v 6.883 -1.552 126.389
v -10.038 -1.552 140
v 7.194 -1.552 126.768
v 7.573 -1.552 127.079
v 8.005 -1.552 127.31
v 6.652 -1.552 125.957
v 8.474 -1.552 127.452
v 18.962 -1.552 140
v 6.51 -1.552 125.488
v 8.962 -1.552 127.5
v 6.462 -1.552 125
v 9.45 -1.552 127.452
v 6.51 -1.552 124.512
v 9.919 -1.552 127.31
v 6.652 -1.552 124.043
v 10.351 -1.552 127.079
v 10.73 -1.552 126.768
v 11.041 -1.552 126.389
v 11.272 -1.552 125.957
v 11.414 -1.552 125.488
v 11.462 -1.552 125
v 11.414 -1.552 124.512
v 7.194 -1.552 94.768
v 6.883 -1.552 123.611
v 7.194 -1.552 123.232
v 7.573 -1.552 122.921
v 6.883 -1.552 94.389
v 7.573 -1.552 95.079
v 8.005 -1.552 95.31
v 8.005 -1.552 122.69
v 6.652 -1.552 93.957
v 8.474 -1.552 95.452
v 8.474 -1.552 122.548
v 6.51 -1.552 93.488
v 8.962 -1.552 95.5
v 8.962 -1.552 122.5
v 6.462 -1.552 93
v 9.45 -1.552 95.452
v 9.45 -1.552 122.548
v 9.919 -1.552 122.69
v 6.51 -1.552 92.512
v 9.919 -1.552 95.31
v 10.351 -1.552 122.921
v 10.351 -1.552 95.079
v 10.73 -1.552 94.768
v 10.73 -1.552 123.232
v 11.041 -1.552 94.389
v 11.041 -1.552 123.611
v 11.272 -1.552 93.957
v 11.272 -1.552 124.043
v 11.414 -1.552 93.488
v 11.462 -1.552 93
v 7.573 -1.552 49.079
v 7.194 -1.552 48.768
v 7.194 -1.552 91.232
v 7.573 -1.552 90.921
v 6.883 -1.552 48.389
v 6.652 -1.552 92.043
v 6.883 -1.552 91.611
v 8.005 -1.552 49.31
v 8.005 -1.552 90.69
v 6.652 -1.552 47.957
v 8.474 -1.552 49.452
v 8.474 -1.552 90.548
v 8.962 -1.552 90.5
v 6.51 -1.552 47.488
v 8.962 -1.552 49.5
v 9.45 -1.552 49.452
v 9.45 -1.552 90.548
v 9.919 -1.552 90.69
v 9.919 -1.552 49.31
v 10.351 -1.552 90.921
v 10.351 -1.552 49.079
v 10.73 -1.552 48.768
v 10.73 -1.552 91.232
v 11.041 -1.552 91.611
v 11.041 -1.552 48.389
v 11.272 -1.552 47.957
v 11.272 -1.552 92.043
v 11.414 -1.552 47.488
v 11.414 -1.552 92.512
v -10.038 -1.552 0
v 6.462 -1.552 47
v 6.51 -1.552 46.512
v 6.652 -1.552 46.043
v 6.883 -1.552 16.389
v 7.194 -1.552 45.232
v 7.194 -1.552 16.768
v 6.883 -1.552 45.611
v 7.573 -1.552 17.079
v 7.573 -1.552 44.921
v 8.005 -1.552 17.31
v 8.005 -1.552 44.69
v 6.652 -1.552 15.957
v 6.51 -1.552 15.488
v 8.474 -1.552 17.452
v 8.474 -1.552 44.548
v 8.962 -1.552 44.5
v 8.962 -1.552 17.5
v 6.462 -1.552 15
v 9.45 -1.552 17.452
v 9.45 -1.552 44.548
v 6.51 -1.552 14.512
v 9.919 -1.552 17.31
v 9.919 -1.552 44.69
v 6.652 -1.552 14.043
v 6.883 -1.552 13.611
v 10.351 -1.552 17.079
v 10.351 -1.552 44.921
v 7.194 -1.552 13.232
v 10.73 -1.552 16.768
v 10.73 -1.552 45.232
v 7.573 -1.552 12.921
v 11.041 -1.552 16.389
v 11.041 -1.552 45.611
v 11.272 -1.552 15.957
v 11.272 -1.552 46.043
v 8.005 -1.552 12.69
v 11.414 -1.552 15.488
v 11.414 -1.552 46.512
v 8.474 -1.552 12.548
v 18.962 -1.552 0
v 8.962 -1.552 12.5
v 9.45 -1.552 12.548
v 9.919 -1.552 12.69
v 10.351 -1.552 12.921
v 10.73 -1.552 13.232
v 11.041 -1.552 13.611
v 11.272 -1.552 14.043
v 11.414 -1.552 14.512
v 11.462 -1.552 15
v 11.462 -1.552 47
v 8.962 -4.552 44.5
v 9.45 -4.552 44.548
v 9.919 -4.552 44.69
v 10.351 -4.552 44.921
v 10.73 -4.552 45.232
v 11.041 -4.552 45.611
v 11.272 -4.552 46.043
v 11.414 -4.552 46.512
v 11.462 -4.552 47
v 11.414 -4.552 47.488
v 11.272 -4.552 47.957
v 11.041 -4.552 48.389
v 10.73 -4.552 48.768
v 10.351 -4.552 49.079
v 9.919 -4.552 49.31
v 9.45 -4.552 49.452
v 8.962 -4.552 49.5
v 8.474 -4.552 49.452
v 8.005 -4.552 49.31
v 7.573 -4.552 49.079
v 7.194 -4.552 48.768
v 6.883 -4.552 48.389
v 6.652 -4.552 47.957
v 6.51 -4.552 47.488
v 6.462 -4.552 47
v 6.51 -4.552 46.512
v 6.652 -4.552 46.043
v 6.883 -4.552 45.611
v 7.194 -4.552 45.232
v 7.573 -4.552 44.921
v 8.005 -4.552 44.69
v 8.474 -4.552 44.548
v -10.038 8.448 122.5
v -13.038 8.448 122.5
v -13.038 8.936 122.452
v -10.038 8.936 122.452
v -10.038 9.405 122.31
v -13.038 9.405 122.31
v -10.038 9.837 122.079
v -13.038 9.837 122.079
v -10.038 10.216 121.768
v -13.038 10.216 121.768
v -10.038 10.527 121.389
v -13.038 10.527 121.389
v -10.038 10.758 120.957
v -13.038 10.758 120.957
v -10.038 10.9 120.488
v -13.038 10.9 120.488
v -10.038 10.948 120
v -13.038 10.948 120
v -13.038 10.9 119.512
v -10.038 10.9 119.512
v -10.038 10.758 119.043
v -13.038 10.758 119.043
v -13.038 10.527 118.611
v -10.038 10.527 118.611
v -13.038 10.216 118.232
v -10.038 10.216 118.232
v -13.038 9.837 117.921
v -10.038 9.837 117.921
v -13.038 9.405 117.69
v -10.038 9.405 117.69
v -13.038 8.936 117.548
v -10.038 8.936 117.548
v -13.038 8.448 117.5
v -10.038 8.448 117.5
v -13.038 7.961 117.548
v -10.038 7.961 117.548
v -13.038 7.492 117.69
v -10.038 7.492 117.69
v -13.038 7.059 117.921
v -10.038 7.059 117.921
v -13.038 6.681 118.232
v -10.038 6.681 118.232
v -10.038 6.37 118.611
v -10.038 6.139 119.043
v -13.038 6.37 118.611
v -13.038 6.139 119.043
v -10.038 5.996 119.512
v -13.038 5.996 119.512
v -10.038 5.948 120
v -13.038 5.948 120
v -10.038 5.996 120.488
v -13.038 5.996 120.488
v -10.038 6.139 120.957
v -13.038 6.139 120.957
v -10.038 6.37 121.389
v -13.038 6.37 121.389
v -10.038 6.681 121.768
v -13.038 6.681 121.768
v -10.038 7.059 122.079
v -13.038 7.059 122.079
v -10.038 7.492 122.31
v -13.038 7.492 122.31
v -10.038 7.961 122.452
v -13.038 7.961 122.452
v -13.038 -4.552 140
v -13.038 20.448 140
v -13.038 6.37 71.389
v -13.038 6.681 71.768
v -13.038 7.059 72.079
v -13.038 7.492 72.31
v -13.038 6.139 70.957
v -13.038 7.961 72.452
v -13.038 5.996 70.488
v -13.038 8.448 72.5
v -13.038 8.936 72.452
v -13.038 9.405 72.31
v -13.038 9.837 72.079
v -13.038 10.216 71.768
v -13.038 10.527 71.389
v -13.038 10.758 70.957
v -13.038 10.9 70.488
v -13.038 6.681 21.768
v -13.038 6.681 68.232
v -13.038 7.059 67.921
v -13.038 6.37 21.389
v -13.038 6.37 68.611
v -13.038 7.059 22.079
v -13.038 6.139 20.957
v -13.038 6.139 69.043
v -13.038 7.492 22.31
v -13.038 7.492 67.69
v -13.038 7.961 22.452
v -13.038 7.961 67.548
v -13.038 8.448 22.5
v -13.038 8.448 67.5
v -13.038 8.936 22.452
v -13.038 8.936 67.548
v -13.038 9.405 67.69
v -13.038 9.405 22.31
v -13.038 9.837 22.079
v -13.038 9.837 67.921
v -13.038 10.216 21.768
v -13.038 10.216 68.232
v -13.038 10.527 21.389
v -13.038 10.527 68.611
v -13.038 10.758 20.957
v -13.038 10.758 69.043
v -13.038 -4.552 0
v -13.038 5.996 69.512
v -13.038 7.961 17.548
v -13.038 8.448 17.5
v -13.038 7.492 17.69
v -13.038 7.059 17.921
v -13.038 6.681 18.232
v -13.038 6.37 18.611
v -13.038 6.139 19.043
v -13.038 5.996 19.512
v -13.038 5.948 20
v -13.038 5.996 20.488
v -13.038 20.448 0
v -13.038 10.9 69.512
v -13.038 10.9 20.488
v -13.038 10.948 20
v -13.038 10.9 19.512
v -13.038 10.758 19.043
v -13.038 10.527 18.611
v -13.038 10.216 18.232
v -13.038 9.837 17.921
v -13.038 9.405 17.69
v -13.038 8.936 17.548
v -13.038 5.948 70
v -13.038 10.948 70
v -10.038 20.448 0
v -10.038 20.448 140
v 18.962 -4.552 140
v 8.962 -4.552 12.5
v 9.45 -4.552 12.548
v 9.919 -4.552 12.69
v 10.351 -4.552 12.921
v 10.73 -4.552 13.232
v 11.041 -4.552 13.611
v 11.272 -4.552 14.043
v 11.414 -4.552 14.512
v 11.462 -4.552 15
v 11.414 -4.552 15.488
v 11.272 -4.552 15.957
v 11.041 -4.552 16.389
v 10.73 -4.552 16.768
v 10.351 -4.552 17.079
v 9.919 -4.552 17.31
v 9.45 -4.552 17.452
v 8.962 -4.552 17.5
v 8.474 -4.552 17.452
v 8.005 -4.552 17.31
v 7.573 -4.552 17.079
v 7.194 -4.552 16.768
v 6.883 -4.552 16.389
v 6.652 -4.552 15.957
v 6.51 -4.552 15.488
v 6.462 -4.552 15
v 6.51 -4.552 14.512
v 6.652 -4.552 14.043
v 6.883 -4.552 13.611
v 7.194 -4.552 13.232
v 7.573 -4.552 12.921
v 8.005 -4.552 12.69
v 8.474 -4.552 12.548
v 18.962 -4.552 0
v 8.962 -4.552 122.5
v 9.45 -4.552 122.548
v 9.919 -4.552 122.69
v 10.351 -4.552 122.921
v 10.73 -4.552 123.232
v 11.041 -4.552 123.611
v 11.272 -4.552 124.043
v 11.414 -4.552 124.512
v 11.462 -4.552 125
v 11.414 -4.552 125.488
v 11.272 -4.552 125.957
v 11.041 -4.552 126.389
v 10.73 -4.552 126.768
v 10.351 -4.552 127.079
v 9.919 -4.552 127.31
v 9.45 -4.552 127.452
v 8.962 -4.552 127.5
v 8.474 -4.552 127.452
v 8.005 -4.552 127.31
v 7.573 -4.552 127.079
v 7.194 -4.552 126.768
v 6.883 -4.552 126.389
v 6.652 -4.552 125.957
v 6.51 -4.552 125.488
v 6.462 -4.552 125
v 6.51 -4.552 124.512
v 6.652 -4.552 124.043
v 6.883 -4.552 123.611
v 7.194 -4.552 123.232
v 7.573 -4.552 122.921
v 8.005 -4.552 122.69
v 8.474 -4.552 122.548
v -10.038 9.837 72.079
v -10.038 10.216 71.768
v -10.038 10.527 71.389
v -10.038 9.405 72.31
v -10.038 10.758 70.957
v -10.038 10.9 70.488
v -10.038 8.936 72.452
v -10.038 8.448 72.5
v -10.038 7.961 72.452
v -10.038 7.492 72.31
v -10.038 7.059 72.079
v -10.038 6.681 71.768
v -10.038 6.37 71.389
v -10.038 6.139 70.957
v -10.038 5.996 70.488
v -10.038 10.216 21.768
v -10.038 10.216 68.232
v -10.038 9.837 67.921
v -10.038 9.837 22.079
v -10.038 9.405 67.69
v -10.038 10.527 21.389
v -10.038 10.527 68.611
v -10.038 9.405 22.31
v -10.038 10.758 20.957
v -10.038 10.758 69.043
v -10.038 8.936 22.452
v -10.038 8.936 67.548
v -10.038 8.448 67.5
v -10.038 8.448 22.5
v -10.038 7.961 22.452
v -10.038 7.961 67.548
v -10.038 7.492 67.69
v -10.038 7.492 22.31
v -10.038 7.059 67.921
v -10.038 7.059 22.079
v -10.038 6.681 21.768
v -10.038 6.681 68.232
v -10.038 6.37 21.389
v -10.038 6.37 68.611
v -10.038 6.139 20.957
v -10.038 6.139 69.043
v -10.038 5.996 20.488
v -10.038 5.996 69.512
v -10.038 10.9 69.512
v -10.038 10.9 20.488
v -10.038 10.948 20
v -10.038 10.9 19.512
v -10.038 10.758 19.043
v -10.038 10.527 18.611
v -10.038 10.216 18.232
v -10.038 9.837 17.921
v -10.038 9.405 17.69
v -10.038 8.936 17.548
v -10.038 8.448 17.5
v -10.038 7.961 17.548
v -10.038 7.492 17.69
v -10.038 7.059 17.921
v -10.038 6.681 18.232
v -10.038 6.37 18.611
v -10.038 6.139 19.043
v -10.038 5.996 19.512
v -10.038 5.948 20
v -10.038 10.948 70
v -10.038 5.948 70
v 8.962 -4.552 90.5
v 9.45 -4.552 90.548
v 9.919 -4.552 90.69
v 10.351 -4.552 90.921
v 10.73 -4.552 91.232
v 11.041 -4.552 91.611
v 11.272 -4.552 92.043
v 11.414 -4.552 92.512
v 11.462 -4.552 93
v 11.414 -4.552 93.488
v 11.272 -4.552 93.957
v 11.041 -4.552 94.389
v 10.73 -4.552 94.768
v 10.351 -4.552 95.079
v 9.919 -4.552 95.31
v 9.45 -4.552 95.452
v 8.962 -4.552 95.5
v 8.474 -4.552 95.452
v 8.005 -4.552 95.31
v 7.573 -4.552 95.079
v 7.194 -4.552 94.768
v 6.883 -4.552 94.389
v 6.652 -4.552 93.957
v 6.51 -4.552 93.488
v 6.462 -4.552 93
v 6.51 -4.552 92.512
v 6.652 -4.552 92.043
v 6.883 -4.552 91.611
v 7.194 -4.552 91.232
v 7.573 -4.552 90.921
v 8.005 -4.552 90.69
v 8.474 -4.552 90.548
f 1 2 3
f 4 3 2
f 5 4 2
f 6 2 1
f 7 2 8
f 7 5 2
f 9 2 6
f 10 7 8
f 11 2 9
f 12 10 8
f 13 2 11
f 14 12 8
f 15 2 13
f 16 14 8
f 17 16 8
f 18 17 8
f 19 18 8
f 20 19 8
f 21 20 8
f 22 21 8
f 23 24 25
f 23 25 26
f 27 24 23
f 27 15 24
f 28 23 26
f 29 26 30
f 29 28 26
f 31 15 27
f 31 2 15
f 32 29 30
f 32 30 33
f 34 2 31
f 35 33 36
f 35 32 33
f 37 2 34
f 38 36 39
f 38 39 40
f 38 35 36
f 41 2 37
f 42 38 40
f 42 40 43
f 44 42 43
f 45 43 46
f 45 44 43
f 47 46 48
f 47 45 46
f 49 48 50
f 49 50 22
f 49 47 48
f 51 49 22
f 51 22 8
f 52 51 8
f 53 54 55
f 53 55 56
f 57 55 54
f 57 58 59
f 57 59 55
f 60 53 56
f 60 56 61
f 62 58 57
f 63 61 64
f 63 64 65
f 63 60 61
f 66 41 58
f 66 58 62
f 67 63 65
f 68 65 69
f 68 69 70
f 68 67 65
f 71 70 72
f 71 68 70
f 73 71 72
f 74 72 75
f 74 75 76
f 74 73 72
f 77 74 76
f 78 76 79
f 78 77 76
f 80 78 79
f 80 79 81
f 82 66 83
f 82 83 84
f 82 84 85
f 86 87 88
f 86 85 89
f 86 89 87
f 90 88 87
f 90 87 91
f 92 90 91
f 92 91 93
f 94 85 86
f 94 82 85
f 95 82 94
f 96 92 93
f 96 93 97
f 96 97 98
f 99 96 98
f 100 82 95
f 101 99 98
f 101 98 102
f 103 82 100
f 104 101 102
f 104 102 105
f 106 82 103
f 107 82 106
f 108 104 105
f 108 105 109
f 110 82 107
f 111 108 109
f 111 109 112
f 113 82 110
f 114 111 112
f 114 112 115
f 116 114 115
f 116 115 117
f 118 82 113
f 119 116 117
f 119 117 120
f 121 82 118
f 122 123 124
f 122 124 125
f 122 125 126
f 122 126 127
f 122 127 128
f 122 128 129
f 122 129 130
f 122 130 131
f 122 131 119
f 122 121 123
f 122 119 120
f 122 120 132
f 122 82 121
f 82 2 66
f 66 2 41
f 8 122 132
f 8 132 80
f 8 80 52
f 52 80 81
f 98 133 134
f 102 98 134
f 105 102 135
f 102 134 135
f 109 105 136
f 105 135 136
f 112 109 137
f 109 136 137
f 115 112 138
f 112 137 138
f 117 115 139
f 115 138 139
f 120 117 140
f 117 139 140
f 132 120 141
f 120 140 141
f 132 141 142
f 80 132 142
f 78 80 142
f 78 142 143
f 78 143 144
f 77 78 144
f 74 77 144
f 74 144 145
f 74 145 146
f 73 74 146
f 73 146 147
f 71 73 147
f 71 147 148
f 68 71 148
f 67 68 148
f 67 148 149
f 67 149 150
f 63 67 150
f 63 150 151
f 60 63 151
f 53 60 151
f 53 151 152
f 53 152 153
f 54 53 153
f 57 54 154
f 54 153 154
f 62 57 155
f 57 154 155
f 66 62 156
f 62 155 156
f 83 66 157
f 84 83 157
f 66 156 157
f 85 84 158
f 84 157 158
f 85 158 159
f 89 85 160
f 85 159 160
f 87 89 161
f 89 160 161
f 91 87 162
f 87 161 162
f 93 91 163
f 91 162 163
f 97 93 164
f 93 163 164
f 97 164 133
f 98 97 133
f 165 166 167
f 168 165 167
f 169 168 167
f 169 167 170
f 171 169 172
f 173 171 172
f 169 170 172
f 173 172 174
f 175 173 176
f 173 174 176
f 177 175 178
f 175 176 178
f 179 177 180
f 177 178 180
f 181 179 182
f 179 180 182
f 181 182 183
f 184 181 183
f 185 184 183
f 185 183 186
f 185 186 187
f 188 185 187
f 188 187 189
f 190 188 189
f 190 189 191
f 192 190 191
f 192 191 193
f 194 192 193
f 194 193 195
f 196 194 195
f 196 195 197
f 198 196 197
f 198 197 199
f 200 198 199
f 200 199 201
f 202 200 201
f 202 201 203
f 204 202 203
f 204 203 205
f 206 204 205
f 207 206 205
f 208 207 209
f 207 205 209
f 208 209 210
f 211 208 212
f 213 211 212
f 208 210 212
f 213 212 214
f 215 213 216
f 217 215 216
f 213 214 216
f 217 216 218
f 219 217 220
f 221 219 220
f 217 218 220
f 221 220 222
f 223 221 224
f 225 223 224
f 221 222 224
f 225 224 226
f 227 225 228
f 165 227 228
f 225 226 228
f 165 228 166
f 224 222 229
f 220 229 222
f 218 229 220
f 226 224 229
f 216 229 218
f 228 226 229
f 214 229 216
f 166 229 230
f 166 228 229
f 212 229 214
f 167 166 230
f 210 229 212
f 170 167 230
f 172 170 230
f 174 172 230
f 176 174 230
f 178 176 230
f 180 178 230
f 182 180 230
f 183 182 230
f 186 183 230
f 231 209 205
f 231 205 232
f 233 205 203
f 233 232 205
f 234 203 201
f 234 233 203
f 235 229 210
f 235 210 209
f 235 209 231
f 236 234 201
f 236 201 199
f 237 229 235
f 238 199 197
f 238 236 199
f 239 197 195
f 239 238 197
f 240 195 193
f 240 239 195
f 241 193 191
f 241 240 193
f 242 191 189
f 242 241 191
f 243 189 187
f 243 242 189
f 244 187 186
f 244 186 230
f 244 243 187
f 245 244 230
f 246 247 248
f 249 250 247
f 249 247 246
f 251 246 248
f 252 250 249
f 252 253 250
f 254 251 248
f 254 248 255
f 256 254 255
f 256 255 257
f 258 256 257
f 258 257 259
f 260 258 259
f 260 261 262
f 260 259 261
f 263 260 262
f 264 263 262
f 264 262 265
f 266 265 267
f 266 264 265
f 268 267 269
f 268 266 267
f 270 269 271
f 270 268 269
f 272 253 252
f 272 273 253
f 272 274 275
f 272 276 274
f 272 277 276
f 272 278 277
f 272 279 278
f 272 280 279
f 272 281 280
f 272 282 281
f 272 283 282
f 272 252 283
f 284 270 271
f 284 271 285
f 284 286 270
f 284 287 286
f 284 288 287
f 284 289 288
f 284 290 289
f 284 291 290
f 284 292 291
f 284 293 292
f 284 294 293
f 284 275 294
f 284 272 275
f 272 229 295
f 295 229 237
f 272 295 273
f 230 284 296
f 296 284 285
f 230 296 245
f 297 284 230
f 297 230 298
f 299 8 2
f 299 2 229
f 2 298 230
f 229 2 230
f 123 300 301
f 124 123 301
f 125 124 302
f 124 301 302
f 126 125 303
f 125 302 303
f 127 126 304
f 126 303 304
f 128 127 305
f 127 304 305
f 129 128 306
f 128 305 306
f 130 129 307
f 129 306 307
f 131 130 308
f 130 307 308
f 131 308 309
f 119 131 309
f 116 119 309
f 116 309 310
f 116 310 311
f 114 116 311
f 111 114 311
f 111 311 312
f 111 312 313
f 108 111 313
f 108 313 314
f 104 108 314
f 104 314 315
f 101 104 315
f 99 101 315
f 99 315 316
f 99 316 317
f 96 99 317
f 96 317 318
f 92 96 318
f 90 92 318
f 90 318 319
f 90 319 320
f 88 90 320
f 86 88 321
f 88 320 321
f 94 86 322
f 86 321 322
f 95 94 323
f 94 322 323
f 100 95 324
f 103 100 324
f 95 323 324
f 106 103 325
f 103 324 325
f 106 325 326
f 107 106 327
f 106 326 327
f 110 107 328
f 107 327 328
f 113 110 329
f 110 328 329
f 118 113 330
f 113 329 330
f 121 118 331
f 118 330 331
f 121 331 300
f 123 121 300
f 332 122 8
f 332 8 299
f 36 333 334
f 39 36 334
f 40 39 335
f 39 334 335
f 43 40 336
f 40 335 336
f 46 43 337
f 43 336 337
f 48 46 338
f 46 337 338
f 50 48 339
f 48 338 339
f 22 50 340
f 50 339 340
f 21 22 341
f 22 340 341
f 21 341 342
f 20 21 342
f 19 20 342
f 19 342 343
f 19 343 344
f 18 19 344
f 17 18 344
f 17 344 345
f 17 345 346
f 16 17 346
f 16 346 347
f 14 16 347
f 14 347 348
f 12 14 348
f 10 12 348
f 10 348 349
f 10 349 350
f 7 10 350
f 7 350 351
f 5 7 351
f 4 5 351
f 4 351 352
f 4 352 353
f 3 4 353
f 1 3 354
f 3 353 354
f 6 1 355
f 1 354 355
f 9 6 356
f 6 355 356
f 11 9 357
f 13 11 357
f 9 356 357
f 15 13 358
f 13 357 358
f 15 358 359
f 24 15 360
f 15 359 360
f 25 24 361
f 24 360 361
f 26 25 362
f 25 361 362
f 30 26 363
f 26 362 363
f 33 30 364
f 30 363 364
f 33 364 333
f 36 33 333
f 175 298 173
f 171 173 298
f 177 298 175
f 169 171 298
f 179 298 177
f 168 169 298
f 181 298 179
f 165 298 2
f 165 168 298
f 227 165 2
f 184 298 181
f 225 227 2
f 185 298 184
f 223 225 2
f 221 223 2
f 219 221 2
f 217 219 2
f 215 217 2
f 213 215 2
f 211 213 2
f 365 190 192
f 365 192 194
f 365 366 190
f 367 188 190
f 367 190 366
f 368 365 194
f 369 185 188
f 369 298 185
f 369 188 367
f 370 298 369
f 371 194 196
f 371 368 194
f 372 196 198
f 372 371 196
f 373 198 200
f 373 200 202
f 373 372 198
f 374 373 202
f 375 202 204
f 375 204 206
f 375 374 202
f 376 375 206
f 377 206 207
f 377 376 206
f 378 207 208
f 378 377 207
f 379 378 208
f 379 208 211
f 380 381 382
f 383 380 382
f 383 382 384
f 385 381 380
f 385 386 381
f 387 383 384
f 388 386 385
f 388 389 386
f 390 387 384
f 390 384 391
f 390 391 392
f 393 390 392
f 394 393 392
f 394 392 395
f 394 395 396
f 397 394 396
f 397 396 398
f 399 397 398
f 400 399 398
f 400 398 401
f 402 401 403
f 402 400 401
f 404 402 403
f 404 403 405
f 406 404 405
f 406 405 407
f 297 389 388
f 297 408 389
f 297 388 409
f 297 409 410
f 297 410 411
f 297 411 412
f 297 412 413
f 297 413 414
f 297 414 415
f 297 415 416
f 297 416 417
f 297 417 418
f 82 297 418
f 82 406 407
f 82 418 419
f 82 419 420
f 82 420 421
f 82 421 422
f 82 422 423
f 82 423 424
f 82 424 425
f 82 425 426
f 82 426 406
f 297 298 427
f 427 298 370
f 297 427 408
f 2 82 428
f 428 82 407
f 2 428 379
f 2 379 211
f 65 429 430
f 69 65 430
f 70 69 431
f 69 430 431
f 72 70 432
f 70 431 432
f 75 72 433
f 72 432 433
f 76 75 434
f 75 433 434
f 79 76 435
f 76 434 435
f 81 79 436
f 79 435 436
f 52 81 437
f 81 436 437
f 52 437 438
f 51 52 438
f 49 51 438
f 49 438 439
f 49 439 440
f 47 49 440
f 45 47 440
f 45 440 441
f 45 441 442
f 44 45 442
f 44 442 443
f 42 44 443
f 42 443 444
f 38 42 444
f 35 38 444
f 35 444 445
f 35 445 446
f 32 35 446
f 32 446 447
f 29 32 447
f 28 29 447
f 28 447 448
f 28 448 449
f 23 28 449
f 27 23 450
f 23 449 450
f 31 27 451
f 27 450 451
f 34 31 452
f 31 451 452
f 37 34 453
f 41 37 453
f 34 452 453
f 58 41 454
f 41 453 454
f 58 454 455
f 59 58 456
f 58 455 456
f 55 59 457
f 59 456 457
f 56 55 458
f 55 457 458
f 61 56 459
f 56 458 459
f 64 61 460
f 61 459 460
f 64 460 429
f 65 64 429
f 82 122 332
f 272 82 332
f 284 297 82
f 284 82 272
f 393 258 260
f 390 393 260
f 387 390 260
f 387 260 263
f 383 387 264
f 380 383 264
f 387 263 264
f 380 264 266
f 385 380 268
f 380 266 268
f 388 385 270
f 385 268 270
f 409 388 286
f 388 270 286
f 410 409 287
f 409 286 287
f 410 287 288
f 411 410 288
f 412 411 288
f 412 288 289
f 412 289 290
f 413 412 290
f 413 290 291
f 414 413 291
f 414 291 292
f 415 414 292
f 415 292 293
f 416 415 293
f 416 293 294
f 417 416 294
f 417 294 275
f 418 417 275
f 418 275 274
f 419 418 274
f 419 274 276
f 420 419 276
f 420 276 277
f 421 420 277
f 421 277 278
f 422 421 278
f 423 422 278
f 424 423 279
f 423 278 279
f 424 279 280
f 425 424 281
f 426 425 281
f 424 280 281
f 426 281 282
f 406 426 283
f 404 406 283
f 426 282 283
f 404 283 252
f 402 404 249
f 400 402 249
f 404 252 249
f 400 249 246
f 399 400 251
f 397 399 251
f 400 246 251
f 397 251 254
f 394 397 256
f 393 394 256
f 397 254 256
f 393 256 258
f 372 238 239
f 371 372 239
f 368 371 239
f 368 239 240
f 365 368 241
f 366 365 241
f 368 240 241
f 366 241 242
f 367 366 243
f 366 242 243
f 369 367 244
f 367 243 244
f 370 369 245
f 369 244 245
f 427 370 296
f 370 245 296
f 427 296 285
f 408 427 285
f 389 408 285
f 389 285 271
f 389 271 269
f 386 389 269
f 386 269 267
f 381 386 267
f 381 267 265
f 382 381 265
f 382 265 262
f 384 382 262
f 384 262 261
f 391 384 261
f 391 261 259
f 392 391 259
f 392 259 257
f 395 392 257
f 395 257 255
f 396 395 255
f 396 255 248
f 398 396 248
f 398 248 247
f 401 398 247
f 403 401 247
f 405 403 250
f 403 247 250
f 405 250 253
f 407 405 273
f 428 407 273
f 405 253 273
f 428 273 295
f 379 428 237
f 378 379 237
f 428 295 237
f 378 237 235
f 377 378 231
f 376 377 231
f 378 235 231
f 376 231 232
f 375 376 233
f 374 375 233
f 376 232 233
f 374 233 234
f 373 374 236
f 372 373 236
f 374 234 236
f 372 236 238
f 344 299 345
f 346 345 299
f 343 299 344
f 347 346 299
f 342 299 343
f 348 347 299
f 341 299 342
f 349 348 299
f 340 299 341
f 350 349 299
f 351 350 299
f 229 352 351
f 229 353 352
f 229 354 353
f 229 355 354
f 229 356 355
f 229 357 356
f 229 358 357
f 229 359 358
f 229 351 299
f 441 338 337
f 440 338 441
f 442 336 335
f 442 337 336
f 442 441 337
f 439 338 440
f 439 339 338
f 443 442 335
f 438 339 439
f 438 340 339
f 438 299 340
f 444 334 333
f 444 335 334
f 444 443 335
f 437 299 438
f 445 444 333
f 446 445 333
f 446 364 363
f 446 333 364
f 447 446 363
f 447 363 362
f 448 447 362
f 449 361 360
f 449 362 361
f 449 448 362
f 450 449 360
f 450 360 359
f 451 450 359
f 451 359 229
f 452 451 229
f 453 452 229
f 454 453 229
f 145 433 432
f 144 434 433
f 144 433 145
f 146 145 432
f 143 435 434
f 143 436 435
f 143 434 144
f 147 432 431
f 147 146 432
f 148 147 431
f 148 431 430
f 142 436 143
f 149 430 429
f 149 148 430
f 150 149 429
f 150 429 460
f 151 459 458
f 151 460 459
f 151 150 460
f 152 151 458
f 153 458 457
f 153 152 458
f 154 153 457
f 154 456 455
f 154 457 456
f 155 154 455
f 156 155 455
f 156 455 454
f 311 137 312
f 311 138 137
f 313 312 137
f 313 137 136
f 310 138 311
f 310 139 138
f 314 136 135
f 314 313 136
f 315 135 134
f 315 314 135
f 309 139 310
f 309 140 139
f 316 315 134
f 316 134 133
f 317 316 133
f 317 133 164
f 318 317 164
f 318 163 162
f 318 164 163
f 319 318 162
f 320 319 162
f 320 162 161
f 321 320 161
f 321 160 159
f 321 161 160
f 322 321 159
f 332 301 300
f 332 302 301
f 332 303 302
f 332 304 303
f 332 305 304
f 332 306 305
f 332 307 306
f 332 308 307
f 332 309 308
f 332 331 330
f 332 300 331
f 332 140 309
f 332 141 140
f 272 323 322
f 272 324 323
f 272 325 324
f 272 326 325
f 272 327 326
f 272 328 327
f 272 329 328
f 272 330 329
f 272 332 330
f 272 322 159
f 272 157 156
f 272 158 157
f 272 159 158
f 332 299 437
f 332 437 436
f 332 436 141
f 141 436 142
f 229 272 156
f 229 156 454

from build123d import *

# Parameters (mm, degrees)
BOSS_EXTRUDE2_DEPTH            = 140
HOLE_FOR_M5_300_SC_NUTS_SP_1_D = 5
HOLE_FOR_M5_300_SC_NUTS_SP_2_D = 5


with BuildPart() as part:
    # Sketch2 → Boss-Extrude2 (new body)
    with BuildSketch(Plane.XY):
        Polygon((-10.037935248, 20.448337429), (-10.037935248, -1.551662571), (18.962064752, -1.551662571), (18.962064752, -4.551662571), (-13.037935248, -4.551662571), (-13.037935248, 20.448337429), align=None)
    extrude(amount=BOSS_EXTRUDE2_DEPTH)

    # Hole for M5 300® SC Nuts (SP)1 (through all)
    with Locations(Plane(origin=(8.962064752, -1.551662571, 15), x_dir=(0, 0, 1), z_dir=(0, 1, 0))):
        with Locations((0, 0), (32, 0), (78, 0), (110, 0)):
            Hole(HOLE_FOR_M5_300_SC_NUTS_SP_1_D / 2)

    # Hole for M5 300® SC Nuts (SP)2 (through all)
    with Locations(Plane(origin=(-10.037935248, 0, 0), x_dir=(0, 0, -1), z_dir=(1, 0, 0))):
        with Locations((-20, 8.448337429), (-70, 8.448337429), (-120, 8.448337429)):
            Hole(HOLE_FOR_M5_300_SC_NUTS_SP_2_D / 2)


solid = part.part
